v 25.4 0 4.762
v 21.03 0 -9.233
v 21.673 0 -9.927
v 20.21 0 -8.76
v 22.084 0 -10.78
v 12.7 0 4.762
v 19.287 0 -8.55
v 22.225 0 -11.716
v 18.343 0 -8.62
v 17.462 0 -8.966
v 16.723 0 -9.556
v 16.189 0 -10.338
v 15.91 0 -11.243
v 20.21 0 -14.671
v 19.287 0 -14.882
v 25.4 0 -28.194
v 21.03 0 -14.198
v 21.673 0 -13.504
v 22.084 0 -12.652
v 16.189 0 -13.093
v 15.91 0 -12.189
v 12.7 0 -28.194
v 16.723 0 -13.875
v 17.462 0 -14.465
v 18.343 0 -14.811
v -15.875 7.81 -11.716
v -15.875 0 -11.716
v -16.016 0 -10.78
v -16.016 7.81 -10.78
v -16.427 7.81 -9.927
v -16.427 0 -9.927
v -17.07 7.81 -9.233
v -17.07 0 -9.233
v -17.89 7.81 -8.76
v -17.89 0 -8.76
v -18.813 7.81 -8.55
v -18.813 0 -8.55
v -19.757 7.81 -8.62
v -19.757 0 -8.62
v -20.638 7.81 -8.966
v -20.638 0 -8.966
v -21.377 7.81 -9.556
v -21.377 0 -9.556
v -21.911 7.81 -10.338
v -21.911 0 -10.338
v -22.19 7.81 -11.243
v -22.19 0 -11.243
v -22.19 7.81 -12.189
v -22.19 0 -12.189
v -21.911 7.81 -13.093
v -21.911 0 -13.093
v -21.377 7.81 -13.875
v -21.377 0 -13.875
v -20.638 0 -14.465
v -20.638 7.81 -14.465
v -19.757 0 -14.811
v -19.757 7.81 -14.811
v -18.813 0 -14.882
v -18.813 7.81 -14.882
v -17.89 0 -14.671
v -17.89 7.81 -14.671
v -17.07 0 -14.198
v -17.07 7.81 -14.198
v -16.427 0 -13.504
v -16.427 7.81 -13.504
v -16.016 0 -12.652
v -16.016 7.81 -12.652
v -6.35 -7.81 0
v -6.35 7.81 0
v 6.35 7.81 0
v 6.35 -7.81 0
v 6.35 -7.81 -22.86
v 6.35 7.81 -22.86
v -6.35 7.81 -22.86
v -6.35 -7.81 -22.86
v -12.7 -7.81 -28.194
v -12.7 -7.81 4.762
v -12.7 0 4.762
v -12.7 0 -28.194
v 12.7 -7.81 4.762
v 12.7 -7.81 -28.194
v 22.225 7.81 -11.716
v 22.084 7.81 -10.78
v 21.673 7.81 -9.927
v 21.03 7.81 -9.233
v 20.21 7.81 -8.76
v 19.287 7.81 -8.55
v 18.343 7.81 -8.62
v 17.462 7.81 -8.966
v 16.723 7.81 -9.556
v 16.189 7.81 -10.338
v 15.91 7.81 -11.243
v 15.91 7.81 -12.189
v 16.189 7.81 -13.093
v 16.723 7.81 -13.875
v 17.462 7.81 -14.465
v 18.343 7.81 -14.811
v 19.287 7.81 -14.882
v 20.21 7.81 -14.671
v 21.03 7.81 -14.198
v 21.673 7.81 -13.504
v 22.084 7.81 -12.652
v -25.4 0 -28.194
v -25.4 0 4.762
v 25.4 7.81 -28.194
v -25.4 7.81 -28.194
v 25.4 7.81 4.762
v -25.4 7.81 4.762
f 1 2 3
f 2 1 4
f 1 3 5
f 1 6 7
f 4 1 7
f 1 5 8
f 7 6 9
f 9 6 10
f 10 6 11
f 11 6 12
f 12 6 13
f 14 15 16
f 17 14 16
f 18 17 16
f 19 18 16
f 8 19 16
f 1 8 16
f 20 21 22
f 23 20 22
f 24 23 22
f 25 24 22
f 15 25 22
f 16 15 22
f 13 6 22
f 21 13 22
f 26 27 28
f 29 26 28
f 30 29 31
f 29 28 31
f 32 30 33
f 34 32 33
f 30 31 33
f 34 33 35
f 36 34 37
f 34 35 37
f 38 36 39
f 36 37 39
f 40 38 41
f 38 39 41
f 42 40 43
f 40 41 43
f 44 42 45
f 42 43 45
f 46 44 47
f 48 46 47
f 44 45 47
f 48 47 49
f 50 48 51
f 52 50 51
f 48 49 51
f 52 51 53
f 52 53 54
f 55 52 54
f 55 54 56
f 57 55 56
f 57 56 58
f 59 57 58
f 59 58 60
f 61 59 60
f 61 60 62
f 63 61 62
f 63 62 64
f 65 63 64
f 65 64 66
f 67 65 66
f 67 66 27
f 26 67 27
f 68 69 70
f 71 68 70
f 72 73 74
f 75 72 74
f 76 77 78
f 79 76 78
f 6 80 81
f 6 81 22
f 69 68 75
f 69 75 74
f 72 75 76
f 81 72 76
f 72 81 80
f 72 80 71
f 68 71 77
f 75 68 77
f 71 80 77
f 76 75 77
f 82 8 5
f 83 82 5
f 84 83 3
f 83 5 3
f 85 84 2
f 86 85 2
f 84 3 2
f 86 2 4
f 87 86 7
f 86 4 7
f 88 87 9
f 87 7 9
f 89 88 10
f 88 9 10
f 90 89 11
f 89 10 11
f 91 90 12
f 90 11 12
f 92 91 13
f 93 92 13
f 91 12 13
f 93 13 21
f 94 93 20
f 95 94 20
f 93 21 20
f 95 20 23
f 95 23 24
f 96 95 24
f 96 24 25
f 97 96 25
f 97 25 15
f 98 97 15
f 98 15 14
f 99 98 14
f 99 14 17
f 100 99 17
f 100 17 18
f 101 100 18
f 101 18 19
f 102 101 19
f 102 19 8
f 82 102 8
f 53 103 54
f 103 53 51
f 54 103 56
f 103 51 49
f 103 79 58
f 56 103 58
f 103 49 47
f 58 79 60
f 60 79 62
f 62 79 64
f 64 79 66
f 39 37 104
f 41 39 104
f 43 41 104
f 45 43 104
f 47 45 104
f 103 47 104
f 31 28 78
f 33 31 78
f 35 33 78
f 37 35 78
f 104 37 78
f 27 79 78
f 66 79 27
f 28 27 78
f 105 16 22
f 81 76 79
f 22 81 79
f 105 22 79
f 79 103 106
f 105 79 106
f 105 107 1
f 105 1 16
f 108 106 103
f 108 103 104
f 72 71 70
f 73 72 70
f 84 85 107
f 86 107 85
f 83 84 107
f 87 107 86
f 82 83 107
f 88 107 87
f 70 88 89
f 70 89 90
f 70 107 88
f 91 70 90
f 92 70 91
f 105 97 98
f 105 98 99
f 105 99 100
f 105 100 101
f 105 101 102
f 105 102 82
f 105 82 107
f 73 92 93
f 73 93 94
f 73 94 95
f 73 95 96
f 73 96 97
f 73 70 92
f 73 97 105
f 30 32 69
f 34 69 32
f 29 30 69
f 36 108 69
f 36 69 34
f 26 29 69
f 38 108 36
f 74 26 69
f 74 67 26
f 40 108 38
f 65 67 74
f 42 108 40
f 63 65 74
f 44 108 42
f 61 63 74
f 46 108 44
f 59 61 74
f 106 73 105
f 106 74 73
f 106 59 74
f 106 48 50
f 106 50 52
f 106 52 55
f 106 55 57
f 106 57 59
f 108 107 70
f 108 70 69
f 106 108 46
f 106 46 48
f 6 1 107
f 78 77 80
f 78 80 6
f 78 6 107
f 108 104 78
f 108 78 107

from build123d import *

# Parameters (mm, degrees)
SKETCH1_W           = 25.4
SKETCH1_H           = 15.621
BOSS_EXTRUDE1_DEPTH = 12.7
SKETCH4_W           = 6.35
SKETCH4_H           = 15.621
BOSS_EXTRUDE4_DEPTH = 22.86
SKETCH5_W           = 25.4
SKETCH5_H           = 7.9375
CUT_EXTRUDE1_DEPTH  = 15.748
SKETCH6_W           = 25.4
SKETCH6_H           = 15.621
BOSS_EXTRUDE5_DEPTH = 5.334
SKETCH7_W           = 32.9565
SKETCH7_H           = 7.8105
BOSS_EXTRUDE6_DEPTH = 12.7
SKETCH8_W           = 32.9565
SKETCH8_H           = 7.8105
BOSS_EXTRUDE7_DEPTH = 12.7
SKETCH9_R           = 3.175
CUT_EXTRUDE2_DEPTH  = 12.7


with BuildPart() as part:
    # Sketch1 → Boss-Extrude1 (new body)
    with BuildSketch(Plane.XY):
        Rectangle(SKETCH1_W, SKETCH1_H)
    extrude(amount=BOSS_EXTRUDE1_DEPTH)

    # Sketch4 → Boss-Extrude4 (add)
    with BuildSketch(Plane(origin=(0, 0, 0), x_dir=(-1, 0, 0), z_dir=(0, 0, -1))):
        with Locations((9.525, 0)):
            Rectangle(SKETCH4_W, SKETCH4_H)
        with Locations((-9.525, 0)):
            Rectangle(SKETCH4_W, SKETCH4_H)
    extrude(amount=BOSS_EXTRUDE4_DEPTH)

    # Sketch5 → Cut-Extrude1 (cut)
    with BuildSketch(Plane(origin=(0, 7.8105, 0), x_dir=(1, 0, 0), z_dir=(0, 1, 0))):
        with Locations((0, -8.73125)):
            Rectangle(SKETCH5_W, SKETCH5_H)
    extrude(amount=-CUT_EXTRUDE1_DEPTH, mode=Mode.SUBTRACT)

    # Sketch6 → Boss-Extrude5 (add)
    with BuildSketch(Plane(origin=(0, 0, -22.86), x_dir=(-1, 0, 0), z_dir=(0, 0, -1))):
        Rectangle(SKETCH6_W, SKETCH6_H)
    extrude(amount=BOSS_EXTRUDE5_DEPTH)

    # Sketch7 → Boss-Extrude6 (add)
    with BuildSketch(Plane.ZY.offset(12.7)):
        with Locations((-11.71575, 3.90525)):
            Rectangle(SKETCH7_W, SKETCH7_H)
    extrude(amount=BOSS_EXTRUDE6_DEPTH)

    # Sketch8 → Boss-Extrude7 (add)
    with BuildSketch(Plane(origin=(12.7, 0, 0), x_dir=(0, 0, -1), z_dir=(1, 0, 0))):
        with Locations((11.71575, 3.90525)):
            Rectangle(SKETCH8_W, SKETCH8_H)
    extrude(amount=BOSS_EXTRUDE7_DEPTH)

    # Sketch9 → Cut-Extrude2 (cut)
    with BuildSketch(Plane.XZ):
        with Locations((-19.05, -11.71575)):
            Circle(SKETCH9_R)
        with Locations((19.05, -11.71575)):
            Circle(SKETCH9_R)
    extrude(amount=-CUT_EXTRUDE2_DEPTH, mode=Mode.SUBTRACT)


solid = part.part
